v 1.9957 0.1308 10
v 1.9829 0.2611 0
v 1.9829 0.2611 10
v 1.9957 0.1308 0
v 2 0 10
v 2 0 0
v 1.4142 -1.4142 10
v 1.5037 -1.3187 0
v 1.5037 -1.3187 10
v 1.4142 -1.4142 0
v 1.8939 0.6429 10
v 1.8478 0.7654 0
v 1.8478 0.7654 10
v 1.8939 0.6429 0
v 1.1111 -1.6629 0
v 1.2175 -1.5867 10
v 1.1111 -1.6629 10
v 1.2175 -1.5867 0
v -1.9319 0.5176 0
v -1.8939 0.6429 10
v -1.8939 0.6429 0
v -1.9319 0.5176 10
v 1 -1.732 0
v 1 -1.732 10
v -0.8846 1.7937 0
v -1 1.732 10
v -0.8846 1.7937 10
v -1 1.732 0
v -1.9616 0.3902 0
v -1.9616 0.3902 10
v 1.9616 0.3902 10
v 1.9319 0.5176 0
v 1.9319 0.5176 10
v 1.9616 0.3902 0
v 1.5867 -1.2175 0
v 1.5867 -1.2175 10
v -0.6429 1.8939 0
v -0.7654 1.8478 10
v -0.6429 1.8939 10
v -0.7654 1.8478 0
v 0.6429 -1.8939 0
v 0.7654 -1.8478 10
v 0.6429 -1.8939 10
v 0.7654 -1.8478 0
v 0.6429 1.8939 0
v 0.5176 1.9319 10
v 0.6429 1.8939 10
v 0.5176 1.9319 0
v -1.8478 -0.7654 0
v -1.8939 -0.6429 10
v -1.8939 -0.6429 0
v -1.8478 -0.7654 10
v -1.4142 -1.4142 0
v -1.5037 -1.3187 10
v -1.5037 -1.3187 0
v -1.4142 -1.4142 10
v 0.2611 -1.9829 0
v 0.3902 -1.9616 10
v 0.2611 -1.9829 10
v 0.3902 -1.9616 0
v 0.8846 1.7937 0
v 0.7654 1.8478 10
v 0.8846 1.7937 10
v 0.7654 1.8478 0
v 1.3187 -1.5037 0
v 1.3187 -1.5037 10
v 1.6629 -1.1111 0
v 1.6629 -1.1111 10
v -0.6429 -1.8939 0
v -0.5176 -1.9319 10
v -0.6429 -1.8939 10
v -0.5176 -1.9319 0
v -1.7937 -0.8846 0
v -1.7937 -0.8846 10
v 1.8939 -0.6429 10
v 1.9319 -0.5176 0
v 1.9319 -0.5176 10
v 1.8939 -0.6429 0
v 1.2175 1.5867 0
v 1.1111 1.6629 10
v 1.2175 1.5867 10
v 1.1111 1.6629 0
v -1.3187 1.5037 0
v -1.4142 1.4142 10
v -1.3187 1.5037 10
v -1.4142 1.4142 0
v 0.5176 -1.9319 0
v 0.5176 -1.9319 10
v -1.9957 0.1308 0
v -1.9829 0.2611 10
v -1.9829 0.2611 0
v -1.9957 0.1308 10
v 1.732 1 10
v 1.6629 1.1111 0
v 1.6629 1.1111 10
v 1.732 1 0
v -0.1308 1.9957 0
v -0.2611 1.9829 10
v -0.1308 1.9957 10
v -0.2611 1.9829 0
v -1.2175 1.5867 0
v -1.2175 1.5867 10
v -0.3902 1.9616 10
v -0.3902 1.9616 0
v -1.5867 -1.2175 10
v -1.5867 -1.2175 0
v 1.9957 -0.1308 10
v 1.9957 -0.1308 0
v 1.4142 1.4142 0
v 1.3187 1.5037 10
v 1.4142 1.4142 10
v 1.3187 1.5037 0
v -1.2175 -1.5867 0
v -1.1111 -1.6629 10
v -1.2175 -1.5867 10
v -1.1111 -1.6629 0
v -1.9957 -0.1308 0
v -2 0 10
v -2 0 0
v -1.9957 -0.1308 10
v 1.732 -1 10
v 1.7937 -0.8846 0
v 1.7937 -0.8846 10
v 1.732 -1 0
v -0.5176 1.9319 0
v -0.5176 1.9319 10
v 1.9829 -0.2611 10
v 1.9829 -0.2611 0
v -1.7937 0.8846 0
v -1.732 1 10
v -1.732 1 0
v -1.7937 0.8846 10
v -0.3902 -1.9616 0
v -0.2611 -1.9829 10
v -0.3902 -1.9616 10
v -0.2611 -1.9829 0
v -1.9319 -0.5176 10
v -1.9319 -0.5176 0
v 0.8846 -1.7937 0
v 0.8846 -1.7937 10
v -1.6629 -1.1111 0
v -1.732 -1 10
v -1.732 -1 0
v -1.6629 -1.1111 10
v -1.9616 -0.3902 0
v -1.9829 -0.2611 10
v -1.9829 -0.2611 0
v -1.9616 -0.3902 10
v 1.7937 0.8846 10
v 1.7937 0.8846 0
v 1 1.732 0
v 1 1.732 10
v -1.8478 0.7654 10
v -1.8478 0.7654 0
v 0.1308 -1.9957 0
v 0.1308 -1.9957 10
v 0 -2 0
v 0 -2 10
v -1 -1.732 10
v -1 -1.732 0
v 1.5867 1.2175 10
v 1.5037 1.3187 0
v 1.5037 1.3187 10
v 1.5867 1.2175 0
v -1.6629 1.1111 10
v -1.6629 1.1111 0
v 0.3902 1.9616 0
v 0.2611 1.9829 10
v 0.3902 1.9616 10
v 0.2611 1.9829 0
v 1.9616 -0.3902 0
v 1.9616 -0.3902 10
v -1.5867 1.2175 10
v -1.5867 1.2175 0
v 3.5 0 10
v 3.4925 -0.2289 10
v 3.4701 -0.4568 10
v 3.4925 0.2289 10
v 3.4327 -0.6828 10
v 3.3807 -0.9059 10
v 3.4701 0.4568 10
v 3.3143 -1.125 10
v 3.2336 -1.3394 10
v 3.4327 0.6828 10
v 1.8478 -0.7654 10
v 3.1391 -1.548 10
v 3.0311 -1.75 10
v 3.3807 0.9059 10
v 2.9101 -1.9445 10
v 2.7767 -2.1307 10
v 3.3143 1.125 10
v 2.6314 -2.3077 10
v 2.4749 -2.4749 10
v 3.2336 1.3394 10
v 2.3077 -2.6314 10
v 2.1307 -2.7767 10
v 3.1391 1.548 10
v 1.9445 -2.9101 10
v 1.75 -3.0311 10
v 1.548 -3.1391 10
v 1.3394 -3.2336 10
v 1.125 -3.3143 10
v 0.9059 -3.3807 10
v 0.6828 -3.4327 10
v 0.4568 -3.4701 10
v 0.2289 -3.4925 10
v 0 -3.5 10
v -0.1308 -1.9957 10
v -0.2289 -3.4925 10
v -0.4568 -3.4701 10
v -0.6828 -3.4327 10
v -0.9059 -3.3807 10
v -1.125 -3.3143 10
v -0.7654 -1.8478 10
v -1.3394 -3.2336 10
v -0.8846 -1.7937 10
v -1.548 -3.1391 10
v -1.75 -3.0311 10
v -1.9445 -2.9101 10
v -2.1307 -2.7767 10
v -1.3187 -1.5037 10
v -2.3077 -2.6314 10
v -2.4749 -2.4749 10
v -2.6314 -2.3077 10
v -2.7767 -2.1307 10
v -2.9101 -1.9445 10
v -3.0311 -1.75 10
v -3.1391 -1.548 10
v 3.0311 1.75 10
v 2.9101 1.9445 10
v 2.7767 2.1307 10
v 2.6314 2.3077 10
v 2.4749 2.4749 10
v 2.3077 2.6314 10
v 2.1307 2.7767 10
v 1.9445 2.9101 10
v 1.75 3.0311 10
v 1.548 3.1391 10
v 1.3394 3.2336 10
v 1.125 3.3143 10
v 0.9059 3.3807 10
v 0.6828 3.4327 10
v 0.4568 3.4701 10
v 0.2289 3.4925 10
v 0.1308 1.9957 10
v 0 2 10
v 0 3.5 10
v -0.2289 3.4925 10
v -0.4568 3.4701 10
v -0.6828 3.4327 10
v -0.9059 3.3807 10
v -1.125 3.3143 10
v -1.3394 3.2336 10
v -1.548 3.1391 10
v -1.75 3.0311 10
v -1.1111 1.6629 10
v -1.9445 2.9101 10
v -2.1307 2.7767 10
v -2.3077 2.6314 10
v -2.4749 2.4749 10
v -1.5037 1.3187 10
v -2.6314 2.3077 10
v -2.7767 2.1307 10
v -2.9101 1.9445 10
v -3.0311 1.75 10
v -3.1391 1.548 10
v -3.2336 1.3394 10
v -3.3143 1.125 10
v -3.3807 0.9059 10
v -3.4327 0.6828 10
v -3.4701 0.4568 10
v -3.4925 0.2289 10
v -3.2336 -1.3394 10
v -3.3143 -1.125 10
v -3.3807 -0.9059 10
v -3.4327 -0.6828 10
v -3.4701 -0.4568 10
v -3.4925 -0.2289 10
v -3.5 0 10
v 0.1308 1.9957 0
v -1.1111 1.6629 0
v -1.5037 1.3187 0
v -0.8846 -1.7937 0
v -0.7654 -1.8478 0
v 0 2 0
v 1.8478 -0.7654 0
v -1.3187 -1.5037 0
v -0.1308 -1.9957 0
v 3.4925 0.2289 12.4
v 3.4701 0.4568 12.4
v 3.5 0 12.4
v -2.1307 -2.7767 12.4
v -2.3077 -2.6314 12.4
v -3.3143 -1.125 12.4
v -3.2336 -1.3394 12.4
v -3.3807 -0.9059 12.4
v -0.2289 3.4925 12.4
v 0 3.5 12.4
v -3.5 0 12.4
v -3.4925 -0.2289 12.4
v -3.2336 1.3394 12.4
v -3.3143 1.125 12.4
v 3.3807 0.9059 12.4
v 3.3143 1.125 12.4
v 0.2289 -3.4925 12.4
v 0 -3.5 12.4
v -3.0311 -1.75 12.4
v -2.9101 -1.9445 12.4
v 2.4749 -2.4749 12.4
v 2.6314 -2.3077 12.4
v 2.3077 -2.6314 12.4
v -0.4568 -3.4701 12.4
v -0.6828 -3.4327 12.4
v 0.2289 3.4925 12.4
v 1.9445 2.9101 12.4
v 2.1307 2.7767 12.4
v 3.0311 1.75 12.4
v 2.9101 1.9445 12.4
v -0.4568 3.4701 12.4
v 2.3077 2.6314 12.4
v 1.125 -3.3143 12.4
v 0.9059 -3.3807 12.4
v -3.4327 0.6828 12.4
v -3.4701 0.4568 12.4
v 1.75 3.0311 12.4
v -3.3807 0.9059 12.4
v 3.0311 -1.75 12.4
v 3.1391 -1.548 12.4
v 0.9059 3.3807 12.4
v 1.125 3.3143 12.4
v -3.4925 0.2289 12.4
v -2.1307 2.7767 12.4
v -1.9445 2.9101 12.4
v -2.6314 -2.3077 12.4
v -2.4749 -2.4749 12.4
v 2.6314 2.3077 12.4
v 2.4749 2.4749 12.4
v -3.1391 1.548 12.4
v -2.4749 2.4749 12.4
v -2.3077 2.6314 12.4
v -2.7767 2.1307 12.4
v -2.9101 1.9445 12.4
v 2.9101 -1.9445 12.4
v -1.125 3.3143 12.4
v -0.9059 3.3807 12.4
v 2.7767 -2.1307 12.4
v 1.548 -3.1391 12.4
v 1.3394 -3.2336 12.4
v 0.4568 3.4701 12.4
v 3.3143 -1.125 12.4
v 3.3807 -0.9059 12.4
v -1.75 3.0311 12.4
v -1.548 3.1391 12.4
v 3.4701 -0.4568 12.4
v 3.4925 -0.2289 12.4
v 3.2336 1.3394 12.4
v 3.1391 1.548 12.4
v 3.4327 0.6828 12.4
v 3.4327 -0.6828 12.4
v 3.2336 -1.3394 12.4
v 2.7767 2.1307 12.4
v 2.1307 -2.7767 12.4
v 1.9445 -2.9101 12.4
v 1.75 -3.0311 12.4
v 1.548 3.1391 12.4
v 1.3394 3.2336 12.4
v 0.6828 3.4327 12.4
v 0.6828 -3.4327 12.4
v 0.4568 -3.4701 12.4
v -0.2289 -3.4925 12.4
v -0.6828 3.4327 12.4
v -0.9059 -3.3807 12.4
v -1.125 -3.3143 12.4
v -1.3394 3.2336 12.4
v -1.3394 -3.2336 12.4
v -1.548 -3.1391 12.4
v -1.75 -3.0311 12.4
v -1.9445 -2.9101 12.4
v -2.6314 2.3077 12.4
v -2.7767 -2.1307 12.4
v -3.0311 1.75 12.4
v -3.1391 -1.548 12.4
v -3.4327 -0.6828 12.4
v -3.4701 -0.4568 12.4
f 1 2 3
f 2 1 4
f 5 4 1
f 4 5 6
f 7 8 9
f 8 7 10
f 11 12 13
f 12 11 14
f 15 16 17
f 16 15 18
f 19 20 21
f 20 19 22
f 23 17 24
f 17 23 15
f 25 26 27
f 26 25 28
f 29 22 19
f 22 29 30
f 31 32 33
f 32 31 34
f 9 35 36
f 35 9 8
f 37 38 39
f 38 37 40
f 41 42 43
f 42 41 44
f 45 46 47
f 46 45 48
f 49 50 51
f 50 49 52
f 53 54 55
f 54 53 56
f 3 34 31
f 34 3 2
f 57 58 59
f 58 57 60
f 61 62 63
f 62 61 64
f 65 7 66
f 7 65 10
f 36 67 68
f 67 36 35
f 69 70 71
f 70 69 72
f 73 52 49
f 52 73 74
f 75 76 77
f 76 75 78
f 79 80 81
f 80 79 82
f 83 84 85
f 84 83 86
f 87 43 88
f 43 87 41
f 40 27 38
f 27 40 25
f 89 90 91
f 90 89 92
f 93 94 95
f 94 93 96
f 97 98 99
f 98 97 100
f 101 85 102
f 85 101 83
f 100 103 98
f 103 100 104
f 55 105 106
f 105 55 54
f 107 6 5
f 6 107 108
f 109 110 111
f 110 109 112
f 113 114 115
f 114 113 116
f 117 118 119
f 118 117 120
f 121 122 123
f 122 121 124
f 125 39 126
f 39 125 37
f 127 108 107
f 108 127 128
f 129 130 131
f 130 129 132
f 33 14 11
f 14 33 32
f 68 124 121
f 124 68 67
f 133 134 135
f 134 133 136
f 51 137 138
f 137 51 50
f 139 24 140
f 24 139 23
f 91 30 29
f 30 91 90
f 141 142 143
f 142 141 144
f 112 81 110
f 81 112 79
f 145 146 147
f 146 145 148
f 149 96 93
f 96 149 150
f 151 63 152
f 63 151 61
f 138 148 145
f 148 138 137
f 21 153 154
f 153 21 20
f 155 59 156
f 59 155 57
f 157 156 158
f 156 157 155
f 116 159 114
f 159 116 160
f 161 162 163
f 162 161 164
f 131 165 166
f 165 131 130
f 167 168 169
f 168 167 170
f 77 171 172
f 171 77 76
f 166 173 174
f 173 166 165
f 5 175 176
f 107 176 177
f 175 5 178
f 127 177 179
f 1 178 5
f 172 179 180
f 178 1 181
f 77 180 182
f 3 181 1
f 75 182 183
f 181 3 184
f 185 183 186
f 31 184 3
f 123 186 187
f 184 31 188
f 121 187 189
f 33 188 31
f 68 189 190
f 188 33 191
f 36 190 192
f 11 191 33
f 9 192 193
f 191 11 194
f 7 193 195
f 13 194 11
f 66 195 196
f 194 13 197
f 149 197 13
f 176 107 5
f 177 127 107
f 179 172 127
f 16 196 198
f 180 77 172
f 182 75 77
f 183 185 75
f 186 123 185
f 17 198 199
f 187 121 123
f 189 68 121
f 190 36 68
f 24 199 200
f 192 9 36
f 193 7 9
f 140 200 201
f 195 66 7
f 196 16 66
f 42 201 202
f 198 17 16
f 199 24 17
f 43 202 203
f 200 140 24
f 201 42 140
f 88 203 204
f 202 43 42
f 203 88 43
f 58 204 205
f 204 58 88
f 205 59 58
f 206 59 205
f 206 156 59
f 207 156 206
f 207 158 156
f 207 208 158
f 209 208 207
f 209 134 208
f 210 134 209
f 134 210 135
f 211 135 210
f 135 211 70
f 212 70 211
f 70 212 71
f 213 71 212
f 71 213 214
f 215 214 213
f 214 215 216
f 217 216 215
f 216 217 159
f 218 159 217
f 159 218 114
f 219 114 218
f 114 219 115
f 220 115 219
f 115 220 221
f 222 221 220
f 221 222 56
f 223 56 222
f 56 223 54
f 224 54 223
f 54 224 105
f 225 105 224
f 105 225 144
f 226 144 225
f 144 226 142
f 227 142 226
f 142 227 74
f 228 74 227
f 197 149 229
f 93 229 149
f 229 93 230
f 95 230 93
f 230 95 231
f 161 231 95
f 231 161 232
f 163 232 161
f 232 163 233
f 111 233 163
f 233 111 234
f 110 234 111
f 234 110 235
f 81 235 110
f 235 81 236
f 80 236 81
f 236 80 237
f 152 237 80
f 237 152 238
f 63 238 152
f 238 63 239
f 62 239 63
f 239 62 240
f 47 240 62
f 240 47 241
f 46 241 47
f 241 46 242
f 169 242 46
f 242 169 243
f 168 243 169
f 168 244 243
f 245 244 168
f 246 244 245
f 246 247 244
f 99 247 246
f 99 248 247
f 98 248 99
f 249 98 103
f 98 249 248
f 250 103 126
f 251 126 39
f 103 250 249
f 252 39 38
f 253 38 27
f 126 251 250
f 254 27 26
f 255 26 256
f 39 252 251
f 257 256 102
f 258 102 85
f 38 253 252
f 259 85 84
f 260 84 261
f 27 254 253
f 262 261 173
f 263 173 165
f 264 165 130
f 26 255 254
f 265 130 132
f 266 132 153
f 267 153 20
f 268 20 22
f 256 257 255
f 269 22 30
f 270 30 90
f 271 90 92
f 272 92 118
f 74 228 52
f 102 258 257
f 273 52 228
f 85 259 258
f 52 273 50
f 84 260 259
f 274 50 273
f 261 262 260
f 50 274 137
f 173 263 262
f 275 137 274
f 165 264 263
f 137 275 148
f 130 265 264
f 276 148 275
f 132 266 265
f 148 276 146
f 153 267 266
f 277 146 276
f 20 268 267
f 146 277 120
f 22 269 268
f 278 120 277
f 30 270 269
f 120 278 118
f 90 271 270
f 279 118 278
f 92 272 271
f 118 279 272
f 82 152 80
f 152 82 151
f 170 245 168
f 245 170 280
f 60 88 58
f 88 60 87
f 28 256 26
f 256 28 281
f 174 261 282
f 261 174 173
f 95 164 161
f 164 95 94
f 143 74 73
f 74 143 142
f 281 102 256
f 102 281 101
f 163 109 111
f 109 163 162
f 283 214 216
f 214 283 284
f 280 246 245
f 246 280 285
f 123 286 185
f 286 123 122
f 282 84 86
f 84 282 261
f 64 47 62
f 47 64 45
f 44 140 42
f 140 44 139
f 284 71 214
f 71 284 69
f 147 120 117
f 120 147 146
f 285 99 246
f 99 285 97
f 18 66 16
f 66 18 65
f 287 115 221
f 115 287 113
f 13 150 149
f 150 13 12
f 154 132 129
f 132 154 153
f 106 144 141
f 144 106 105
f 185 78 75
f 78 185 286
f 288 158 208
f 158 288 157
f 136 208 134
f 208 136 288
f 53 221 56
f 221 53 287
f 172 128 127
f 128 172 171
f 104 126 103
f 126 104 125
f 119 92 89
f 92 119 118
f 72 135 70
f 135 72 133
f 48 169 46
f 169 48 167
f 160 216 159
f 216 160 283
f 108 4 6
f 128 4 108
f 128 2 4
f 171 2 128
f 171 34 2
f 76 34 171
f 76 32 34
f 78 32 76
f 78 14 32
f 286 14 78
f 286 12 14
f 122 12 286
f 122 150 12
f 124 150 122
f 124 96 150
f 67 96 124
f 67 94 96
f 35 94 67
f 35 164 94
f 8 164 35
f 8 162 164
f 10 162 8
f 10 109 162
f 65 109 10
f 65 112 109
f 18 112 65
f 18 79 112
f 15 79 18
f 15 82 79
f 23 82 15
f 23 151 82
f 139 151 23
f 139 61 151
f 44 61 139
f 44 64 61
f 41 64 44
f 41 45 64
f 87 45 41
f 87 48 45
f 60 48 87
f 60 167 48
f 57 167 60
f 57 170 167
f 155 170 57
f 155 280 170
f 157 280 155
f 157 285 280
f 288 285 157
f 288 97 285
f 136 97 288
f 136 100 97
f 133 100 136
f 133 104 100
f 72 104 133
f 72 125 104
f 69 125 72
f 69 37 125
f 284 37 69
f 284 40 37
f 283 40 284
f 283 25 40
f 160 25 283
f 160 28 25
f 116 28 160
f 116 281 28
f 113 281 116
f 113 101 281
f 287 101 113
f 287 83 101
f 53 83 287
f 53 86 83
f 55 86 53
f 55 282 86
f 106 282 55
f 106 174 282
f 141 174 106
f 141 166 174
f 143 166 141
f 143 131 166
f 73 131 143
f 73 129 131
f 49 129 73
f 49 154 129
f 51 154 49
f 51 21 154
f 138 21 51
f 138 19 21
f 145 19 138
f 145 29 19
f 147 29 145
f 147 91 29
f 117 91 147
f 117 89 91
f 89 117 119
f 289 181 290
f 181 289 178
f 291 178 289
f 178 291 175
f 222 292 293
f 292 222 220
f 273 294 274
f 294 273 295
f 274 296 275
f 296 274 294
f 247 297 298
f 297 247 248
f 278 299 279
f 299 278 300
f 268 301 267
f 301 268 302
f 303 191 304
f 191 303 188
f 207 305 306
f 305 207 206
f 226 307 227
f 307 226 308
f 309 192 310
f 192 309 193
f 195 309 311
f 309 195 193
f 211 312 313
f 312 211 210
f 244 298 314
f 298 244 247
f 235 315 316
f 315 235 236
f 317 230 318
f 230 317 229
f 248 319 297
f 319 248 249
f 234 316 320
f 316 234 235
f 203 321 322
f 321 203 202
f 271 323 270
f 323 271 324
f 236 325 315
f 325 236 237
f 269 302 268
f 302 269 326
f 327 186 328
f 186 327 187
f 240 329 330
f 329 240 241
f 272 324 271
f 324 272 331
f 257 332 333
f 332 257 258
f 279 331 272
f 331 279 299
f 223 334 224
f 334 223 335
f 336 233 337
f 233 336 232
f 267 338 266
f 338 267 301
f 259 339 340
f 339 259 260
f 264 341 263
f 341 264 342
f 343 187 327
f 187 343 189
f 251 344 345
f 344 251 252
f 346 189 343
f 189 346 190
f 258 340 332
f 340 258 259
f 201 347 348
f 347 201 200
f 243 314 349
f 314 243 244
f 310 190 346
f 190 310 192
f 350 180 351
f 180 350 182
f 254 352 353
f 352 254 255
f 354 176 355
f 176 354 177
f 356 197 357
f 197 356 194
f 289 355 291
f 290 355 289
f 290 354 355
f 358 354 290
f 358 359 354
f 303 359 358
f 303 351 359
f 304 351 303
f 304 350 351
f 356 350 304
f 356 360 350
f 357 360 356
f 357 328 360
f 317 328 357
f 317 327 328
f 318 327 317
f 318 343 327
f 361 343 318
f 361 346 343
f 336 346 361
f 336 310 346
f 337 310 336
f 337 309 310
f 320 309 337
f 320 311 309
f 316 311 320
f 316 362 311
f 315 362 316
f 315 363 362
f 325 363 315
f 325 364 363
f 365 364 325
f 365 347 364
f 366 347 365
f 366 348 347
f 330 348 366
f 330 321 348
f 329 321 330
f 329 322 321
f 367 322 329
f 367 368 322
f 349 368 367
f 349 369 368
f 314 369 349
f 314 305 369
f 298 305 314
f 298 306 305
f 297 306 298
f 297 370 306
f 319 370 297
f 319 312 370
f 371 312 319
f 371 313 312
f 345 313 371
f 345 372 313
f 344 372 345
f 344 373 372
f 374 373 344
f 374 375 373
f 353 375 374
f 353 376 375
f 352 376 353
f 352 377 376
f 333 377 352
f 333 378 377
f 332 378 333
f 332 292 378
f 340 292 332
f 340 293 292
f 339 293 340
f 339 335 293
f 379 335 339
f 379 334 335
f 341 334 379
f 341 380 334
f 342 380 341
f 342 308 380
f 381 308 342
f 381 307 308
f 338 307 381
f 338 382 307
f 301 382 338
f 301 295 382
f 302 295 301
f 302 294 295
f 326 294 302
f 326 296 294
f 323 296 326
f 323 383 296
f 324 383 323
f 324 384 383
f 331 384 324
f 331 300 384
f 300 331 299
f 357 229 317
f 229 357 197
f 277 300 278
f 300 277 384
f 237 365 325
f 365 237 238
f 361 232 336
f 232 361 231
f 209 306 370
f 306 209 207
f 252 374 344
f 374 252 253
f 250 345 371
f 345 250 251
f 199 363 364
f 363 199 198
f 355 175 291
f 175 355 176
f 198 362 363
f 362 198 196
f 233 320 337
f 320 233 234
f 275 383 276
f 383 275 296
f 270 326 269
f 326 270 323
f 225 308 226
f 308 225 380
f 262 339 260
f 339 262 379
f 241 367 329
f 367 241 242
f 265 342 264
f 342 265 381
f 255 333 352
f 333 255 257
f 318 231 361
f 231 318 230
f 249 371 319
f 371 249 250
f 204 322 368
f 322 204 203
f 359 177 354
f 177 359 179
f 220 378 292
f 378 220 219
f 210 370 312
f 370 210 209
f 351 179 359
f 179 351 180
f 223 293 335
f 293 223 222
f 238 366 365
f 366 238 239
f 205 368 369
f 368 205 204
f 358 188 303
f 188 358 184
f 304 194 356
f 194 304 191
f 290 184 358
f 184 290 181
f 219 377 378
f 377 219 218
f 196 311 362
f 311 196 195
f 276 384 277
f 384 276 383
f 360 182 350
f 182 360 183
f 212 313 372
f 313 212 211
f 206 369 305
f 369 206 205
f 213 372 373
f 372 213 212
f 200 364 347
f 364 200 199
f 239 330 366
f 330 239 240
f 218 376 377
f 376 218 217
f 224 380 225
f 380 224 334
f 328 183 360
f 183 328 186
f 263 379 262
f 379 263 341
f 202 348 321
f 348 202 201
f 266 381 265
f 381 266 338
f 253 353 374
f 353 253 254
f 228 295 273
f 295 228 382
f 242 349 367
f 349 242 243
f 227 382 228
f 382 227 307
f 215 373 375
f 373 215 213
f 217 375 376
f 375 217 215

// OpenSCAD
$fn=96;

shaft_d = 4.0;
head_d  = 7.0;
head_h  = 2.4;
len     = 10.0;

union() {
  // Shaft
  cylinder(d=shaft_d, h=len);

  // Head
  translate([0,0,len])
    cylinder(d=head_d, h=head_h);
}
